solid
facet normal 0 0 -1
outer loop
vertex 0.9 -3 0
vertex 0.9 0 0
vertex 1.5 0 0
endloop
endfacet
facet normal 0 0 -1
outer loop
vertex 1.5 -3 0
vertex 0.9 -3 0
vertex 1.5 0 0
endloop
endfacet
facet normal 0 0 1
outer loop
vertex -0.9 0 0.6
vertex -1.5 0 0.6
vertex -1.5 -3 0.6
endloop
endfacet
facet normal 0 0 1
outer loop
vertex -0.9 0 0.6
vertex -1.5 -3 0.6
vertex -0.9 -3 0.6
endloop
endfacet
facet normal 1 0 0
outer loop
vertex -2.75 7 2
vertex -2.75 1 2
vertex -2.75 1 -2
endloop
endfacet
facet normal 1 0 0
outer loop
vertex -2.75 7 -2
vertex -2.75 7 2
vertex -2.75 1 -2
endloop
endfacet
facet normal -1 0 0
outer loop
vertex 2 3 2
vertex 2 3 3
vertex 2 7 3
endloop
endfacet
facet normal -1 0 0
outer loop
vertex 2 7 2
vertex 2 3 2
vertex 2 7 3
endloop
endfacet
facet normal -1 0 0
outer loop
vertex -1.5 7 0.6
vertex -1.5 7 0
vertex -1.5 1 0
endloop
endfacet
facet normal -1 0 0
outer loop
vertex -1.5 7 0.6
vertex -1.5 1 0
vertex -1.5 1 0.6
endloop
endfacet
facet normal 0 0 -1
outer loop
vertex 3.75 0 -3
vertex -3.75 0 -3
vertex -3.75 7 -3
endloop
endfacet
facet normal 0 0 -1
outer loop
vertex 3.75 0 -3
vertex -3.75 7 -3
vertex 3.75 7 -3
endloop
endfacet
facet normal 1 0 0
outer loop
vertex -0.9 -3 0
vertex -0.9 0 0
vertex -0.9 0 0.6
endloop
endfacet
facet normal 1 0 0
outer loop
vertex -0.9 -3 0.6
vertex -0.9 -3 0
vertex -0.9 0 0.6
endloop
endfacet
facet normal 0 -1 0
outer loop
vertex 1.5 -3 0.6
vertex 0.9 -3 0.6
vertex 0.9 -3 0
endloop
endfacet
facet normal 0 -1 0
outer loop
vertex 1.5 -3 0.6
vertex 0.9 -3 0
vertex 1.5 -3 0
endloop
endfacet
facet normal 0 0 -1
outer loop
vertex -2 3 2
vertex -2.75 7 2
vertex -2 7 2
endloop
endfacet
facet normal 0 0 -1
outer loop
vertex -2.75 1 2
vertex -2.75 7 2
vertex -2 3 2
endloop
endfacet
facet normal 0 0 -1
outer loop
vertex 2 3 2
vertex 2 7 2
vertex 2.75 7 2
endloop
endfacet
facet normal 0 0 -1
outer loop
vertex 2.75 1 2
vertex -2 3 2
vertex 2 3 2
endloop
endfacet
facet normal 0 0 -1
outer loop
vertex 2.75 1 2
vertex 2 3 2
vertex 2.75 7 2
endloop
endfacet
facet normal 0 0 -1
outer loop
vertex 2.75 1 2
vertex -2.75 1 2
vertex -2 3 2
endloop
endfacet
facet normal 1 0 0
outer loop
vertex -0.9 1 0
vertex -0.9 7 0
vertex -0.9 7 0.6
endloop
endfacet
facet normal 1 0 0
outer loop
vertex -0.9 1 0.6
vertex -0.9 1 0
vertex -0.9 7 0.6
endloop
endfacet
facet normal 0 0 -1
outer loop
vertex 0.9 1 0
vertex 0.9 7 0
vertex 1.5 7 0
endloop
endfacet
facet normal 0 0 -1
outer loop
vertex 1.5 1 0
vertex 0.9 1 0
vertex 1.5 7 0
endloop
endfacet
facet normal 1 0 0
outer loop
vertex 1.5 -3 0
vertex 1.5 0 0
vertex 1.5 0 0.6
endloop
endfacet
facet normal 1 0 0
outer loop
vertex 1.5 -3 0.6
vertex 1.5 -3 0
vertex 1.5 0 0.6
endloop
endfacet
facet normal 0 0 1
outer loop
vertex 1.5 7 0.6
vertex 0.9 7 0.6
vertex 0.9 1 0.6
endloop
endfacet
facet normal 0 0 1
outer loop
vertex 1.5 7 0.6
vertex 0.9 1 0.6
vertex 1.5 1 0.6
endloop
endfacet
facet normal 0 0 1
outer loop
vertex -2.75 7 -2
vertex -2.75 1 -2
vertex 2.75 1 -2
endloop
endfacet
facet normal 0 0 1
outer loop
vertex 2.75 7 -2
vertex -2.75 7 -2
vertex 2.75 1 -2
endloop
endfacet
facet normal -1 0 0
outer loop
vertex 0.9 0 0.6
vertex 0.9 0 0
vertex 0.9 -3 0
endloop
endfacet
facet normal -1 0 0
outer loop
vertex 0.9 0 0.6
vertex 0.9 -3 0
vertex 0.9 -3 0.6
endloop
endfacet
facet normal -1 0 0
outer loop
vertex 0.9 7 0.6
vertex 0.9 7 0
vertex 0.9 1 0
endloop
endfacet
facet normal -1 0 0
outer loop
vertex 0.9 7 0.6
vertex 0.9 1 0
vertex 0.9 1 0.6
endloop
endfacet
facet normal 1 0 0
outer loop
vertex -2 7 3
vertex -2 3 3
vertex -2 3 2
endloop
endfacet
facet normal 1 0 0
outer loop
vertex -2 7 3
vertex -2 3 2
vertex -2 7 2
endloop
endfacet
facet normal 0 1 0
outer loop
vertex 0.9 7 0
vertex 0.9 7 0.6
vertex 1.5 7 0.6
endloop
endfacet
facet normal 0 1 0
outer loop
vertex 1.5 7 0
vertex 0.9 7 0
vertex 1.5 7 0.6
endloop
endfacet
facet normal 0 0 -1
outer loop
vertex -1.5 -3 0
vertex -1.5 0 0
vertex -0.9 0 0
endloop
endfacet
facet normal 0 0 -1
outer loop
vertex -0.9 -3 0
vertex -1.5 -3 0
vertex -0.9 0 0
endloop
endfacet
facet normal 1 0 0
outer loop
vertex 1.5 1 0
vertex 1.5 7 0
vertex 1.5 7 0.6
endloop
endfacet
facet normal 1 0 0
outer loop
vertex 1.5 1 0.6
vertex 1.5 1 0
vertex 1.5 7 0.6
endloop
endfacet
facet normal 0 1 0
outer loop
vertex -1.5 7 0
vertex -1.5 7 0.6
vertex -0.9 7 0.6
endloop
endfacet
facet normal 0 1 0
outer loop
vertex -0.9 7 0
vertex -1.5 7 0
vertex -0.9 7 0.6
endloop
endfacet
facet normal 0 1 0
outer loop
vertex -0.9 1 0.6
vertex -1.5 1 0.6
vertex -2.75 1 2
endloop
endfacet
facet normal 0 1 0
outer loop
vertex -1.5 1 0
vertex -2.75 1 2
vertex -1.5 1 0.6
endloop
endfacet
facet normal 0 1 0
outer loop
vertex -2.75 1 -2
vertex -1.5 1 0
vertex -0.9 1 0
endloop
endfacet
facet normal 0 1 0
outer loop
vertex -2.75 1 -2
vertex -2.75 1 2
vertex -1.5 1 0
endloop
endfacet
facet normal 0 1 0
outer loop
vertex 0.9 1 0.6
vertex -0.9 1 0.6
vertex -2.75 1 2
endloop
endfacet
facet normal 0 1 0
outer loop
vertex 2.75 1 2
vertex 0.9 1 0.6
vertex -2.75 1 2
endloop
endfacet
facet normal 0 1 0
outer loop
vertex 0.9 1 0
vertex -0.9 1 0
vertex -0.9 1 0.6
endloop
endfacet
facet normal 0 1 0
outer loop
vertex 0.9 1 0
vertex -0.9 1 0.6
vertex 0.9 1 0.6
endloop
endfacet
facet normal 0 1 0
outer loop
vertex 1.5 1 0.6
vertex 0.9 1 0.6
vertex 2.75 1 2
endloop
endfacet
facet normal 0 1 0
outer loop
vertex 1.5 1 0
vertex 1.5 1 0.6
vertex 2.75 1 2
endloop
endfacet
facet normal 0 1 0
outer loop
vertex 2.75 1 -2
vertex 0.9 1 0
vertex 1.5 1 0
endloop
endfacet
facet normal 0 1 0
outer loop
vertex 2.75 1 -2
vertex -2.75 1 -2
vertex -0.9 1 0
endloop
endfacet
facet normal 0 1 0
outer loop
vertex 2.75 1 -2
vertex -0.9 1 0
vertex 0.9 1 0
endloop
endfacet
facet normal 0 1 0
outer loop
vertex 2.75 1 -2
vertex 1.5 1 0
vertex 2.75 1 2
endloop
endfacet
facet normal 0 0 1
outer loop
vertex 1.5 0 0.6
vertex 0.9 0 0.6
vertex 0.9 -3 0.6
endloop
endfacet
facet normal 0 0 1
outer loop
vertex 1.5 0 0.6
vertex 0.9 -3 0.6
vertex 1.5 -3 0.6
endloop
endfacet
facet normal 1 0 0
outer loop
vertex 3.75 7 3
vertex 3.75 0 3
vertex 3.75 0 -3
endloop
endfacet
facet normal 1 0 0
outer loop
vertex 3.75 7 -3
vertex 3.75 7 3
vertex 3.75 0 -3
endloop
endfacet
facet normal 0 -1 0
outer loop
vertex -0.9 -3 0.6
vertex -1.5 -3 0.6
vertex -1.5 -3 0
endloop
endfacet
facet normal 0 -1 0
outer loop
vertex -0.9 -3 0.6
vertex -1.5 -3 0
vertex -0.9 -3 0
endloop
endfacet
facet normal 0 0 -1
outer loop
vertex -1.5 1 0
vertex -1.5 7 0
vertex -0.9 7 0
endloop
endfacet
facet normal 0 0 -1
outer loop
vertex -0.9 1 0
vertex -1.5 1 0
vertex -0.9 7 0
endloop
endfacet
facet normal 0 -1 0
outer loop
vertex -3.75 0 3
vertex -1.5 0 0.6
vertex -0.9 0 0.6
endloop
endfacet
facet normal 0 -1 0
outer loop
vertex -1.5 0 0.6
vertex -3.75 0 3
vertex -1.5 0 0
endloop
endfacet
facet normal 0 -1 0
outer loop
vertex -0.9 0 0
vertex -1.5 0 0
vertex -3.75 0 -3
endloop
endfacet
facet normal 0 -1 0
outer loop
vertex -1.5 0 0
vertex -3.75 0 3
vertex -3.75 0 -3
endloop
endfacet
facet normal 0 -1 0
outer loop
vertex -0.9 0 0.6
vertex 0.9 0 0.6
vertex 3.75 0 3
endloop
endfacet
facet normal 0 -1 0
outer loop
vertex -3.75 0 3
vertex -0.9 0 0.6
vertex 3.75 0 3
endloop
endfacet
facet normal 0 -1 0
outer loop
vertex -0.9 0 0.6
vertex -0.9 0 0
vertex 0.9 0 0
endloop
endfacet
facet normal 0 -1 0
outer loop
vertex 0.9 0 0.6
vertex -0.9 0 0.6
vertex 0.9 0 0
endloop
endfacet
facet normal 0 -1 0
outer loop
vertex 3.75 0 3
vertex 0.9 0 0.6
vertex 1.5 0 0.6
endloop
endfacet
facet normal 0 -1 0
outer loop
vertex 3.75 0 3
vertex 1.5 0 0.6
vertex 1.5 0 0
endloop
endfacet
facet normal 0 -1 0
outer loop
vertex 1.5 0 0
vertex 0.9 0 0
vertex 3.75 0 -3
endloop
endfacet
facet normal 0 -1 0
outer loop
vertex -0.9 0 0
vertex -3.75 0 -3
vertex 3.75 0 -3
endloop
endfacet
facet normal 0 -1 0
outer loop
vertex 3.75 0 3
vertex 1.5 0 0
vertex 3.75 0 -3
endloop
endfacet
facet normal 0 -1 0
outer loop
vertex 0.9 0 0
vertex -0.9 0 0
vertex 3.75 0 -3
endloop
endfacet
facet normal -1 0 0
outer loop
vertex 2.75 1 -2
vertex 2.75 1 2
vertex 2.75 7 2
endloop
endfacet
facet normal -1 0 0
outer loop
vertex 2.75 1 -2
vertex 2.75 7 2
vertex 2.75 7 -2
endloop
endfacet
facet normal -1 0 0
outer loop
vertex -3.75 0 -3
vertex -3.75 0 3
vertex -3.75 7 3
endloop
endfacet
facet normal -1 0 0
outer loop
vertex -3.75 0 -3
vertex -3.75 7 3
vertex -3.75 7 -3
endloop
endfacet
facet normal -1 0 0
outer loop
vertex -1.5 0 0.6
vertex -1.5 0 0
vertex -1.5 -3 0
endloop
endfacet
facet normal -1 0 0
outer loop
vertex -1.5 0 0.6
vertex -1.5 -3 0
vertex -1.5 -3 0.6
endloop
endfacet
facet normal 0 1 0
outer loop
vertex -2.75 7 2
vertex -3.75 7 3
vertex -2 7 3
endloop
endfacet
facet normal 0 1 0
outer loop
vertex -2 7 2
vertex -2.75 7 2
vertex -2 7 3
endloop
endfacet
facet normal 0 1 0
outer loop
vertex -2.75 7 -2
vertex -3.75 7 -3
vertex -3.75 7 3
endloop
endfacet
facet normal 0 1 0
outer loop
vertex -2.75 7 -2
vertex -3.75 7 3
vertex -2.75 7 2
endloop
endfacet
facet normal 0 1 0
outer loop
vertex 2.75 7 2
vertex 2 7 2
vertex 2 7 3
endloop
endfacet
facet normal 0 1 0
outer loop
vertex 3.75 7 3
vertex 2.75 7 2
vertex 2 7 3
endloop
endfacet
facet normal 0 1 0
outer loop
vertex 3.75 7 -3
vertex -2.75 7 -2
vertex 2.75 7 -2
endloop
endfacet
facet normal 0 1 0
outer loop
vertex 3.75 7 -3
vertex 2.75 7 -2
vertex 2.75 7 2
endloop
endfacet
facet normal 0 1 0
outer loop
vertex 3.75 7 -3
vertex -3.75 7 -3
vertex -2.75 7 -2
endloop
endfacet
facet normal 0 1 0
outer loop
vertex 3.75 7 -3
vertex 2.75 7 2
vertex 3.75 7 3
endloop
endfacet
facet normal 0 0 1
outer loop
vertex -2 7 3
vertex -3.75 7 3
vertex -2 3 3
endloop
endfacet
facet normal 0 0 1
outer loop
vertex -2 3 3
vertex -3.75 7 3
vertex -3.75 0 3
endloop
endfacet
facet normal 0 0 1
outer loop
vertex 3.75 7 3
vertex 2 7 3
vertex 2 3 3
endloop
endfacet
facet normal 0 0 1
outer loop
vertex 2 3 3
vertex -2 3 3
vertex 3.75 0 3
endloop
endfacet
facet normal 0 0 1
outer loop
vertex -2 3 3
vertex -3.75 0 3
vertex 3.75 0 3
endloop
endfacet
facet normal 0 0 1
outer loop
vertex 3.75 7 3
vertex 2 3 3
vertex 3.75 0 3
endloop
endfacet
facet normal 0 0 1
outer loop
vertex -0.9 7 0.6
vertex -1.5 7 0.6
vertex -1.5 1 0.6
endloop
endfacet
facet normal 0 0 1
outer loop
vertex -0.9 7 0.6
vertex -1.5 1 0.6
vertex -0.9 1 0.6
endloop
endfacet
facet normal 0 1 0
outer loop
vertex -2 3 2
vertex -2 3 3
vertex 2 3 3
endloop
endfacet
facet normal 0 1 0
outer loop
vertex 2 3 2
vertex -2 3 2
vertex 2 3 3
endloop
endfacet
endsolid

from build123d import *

# Parameters (mm, degrees)
SKETCH_1_W          = 7.5
SKETCH_1_H          = 6
EXTRUDE_1_DEPTH     = 7
SHELL_1_T           = -1
CUT_EXTRUDE_1_REACH = 8
SKETCH_2_W          = 4
SKETCH_2_H          = 4
EXTRUDE_START       = -7
SKETCH_3_W          = 0.6
SKETCH_3_H          = 0.6
EXTRUDE_2_DEPTH     = 10


with BuildPart() as part:
    # 草图1 → 凸台-拉伸1 (new body)
    with BuildSketch(Plane(origin=(0, 0, 0), x_dir=(1, 0, 0), z_dir=(0, 1, 0))):
        Rectangle(SKETCH_1_W, SKETCH_1_H)
    extrude(amount=EXTRUDE_1_DEPTH)

    # 抽壳1
    shell_1_openings = [part.faces().sort_by_distance(p)[0] for p in [
        (0, 7, 0),
    ]]
    offset(amount=SHELL_1_T, openings=shell_1_openings, kind=Kind.INTERSECTION)

    # 草图2 → 切除-拉伸1 (cut, up to next)
    with BuildSketch(Plane.XY.offset(3), mode=Mode.PRIVATE) as cut_extrude_1_sk1:
        with Locations((0, 5)):
            Rectangle(SKETCH_2_W, SKETCH_2_H)
    cut_extrude_1_tool1 = extrude(cut_extrude_1_sk1.sketch, amount=-CUT_EXTRUDE_1_REACH, mode=Mode.PRIVATE) & part.part
    add(cut_extrude_1_tool1.solids().sort_by_distance((0, 5, 3))[0], mode=Mode.SUBTRACT)

    # 草图3 → 凸台-拉伸2 (add)
    with BuildSketch(Plane.XZ.offset(EXTRUDE_START)):
        with Locations((-1.2, 0.3)):
            Rectangle(SKETCH_3_W, SKETCH_3_H)
        with Locations((1.2, 0.3)):
            Rectangle(SKETCH_3_W, SKETCH_3_H)
    extrude(amount=EXTRUDE_2_DEPTH)


solid = part.part
